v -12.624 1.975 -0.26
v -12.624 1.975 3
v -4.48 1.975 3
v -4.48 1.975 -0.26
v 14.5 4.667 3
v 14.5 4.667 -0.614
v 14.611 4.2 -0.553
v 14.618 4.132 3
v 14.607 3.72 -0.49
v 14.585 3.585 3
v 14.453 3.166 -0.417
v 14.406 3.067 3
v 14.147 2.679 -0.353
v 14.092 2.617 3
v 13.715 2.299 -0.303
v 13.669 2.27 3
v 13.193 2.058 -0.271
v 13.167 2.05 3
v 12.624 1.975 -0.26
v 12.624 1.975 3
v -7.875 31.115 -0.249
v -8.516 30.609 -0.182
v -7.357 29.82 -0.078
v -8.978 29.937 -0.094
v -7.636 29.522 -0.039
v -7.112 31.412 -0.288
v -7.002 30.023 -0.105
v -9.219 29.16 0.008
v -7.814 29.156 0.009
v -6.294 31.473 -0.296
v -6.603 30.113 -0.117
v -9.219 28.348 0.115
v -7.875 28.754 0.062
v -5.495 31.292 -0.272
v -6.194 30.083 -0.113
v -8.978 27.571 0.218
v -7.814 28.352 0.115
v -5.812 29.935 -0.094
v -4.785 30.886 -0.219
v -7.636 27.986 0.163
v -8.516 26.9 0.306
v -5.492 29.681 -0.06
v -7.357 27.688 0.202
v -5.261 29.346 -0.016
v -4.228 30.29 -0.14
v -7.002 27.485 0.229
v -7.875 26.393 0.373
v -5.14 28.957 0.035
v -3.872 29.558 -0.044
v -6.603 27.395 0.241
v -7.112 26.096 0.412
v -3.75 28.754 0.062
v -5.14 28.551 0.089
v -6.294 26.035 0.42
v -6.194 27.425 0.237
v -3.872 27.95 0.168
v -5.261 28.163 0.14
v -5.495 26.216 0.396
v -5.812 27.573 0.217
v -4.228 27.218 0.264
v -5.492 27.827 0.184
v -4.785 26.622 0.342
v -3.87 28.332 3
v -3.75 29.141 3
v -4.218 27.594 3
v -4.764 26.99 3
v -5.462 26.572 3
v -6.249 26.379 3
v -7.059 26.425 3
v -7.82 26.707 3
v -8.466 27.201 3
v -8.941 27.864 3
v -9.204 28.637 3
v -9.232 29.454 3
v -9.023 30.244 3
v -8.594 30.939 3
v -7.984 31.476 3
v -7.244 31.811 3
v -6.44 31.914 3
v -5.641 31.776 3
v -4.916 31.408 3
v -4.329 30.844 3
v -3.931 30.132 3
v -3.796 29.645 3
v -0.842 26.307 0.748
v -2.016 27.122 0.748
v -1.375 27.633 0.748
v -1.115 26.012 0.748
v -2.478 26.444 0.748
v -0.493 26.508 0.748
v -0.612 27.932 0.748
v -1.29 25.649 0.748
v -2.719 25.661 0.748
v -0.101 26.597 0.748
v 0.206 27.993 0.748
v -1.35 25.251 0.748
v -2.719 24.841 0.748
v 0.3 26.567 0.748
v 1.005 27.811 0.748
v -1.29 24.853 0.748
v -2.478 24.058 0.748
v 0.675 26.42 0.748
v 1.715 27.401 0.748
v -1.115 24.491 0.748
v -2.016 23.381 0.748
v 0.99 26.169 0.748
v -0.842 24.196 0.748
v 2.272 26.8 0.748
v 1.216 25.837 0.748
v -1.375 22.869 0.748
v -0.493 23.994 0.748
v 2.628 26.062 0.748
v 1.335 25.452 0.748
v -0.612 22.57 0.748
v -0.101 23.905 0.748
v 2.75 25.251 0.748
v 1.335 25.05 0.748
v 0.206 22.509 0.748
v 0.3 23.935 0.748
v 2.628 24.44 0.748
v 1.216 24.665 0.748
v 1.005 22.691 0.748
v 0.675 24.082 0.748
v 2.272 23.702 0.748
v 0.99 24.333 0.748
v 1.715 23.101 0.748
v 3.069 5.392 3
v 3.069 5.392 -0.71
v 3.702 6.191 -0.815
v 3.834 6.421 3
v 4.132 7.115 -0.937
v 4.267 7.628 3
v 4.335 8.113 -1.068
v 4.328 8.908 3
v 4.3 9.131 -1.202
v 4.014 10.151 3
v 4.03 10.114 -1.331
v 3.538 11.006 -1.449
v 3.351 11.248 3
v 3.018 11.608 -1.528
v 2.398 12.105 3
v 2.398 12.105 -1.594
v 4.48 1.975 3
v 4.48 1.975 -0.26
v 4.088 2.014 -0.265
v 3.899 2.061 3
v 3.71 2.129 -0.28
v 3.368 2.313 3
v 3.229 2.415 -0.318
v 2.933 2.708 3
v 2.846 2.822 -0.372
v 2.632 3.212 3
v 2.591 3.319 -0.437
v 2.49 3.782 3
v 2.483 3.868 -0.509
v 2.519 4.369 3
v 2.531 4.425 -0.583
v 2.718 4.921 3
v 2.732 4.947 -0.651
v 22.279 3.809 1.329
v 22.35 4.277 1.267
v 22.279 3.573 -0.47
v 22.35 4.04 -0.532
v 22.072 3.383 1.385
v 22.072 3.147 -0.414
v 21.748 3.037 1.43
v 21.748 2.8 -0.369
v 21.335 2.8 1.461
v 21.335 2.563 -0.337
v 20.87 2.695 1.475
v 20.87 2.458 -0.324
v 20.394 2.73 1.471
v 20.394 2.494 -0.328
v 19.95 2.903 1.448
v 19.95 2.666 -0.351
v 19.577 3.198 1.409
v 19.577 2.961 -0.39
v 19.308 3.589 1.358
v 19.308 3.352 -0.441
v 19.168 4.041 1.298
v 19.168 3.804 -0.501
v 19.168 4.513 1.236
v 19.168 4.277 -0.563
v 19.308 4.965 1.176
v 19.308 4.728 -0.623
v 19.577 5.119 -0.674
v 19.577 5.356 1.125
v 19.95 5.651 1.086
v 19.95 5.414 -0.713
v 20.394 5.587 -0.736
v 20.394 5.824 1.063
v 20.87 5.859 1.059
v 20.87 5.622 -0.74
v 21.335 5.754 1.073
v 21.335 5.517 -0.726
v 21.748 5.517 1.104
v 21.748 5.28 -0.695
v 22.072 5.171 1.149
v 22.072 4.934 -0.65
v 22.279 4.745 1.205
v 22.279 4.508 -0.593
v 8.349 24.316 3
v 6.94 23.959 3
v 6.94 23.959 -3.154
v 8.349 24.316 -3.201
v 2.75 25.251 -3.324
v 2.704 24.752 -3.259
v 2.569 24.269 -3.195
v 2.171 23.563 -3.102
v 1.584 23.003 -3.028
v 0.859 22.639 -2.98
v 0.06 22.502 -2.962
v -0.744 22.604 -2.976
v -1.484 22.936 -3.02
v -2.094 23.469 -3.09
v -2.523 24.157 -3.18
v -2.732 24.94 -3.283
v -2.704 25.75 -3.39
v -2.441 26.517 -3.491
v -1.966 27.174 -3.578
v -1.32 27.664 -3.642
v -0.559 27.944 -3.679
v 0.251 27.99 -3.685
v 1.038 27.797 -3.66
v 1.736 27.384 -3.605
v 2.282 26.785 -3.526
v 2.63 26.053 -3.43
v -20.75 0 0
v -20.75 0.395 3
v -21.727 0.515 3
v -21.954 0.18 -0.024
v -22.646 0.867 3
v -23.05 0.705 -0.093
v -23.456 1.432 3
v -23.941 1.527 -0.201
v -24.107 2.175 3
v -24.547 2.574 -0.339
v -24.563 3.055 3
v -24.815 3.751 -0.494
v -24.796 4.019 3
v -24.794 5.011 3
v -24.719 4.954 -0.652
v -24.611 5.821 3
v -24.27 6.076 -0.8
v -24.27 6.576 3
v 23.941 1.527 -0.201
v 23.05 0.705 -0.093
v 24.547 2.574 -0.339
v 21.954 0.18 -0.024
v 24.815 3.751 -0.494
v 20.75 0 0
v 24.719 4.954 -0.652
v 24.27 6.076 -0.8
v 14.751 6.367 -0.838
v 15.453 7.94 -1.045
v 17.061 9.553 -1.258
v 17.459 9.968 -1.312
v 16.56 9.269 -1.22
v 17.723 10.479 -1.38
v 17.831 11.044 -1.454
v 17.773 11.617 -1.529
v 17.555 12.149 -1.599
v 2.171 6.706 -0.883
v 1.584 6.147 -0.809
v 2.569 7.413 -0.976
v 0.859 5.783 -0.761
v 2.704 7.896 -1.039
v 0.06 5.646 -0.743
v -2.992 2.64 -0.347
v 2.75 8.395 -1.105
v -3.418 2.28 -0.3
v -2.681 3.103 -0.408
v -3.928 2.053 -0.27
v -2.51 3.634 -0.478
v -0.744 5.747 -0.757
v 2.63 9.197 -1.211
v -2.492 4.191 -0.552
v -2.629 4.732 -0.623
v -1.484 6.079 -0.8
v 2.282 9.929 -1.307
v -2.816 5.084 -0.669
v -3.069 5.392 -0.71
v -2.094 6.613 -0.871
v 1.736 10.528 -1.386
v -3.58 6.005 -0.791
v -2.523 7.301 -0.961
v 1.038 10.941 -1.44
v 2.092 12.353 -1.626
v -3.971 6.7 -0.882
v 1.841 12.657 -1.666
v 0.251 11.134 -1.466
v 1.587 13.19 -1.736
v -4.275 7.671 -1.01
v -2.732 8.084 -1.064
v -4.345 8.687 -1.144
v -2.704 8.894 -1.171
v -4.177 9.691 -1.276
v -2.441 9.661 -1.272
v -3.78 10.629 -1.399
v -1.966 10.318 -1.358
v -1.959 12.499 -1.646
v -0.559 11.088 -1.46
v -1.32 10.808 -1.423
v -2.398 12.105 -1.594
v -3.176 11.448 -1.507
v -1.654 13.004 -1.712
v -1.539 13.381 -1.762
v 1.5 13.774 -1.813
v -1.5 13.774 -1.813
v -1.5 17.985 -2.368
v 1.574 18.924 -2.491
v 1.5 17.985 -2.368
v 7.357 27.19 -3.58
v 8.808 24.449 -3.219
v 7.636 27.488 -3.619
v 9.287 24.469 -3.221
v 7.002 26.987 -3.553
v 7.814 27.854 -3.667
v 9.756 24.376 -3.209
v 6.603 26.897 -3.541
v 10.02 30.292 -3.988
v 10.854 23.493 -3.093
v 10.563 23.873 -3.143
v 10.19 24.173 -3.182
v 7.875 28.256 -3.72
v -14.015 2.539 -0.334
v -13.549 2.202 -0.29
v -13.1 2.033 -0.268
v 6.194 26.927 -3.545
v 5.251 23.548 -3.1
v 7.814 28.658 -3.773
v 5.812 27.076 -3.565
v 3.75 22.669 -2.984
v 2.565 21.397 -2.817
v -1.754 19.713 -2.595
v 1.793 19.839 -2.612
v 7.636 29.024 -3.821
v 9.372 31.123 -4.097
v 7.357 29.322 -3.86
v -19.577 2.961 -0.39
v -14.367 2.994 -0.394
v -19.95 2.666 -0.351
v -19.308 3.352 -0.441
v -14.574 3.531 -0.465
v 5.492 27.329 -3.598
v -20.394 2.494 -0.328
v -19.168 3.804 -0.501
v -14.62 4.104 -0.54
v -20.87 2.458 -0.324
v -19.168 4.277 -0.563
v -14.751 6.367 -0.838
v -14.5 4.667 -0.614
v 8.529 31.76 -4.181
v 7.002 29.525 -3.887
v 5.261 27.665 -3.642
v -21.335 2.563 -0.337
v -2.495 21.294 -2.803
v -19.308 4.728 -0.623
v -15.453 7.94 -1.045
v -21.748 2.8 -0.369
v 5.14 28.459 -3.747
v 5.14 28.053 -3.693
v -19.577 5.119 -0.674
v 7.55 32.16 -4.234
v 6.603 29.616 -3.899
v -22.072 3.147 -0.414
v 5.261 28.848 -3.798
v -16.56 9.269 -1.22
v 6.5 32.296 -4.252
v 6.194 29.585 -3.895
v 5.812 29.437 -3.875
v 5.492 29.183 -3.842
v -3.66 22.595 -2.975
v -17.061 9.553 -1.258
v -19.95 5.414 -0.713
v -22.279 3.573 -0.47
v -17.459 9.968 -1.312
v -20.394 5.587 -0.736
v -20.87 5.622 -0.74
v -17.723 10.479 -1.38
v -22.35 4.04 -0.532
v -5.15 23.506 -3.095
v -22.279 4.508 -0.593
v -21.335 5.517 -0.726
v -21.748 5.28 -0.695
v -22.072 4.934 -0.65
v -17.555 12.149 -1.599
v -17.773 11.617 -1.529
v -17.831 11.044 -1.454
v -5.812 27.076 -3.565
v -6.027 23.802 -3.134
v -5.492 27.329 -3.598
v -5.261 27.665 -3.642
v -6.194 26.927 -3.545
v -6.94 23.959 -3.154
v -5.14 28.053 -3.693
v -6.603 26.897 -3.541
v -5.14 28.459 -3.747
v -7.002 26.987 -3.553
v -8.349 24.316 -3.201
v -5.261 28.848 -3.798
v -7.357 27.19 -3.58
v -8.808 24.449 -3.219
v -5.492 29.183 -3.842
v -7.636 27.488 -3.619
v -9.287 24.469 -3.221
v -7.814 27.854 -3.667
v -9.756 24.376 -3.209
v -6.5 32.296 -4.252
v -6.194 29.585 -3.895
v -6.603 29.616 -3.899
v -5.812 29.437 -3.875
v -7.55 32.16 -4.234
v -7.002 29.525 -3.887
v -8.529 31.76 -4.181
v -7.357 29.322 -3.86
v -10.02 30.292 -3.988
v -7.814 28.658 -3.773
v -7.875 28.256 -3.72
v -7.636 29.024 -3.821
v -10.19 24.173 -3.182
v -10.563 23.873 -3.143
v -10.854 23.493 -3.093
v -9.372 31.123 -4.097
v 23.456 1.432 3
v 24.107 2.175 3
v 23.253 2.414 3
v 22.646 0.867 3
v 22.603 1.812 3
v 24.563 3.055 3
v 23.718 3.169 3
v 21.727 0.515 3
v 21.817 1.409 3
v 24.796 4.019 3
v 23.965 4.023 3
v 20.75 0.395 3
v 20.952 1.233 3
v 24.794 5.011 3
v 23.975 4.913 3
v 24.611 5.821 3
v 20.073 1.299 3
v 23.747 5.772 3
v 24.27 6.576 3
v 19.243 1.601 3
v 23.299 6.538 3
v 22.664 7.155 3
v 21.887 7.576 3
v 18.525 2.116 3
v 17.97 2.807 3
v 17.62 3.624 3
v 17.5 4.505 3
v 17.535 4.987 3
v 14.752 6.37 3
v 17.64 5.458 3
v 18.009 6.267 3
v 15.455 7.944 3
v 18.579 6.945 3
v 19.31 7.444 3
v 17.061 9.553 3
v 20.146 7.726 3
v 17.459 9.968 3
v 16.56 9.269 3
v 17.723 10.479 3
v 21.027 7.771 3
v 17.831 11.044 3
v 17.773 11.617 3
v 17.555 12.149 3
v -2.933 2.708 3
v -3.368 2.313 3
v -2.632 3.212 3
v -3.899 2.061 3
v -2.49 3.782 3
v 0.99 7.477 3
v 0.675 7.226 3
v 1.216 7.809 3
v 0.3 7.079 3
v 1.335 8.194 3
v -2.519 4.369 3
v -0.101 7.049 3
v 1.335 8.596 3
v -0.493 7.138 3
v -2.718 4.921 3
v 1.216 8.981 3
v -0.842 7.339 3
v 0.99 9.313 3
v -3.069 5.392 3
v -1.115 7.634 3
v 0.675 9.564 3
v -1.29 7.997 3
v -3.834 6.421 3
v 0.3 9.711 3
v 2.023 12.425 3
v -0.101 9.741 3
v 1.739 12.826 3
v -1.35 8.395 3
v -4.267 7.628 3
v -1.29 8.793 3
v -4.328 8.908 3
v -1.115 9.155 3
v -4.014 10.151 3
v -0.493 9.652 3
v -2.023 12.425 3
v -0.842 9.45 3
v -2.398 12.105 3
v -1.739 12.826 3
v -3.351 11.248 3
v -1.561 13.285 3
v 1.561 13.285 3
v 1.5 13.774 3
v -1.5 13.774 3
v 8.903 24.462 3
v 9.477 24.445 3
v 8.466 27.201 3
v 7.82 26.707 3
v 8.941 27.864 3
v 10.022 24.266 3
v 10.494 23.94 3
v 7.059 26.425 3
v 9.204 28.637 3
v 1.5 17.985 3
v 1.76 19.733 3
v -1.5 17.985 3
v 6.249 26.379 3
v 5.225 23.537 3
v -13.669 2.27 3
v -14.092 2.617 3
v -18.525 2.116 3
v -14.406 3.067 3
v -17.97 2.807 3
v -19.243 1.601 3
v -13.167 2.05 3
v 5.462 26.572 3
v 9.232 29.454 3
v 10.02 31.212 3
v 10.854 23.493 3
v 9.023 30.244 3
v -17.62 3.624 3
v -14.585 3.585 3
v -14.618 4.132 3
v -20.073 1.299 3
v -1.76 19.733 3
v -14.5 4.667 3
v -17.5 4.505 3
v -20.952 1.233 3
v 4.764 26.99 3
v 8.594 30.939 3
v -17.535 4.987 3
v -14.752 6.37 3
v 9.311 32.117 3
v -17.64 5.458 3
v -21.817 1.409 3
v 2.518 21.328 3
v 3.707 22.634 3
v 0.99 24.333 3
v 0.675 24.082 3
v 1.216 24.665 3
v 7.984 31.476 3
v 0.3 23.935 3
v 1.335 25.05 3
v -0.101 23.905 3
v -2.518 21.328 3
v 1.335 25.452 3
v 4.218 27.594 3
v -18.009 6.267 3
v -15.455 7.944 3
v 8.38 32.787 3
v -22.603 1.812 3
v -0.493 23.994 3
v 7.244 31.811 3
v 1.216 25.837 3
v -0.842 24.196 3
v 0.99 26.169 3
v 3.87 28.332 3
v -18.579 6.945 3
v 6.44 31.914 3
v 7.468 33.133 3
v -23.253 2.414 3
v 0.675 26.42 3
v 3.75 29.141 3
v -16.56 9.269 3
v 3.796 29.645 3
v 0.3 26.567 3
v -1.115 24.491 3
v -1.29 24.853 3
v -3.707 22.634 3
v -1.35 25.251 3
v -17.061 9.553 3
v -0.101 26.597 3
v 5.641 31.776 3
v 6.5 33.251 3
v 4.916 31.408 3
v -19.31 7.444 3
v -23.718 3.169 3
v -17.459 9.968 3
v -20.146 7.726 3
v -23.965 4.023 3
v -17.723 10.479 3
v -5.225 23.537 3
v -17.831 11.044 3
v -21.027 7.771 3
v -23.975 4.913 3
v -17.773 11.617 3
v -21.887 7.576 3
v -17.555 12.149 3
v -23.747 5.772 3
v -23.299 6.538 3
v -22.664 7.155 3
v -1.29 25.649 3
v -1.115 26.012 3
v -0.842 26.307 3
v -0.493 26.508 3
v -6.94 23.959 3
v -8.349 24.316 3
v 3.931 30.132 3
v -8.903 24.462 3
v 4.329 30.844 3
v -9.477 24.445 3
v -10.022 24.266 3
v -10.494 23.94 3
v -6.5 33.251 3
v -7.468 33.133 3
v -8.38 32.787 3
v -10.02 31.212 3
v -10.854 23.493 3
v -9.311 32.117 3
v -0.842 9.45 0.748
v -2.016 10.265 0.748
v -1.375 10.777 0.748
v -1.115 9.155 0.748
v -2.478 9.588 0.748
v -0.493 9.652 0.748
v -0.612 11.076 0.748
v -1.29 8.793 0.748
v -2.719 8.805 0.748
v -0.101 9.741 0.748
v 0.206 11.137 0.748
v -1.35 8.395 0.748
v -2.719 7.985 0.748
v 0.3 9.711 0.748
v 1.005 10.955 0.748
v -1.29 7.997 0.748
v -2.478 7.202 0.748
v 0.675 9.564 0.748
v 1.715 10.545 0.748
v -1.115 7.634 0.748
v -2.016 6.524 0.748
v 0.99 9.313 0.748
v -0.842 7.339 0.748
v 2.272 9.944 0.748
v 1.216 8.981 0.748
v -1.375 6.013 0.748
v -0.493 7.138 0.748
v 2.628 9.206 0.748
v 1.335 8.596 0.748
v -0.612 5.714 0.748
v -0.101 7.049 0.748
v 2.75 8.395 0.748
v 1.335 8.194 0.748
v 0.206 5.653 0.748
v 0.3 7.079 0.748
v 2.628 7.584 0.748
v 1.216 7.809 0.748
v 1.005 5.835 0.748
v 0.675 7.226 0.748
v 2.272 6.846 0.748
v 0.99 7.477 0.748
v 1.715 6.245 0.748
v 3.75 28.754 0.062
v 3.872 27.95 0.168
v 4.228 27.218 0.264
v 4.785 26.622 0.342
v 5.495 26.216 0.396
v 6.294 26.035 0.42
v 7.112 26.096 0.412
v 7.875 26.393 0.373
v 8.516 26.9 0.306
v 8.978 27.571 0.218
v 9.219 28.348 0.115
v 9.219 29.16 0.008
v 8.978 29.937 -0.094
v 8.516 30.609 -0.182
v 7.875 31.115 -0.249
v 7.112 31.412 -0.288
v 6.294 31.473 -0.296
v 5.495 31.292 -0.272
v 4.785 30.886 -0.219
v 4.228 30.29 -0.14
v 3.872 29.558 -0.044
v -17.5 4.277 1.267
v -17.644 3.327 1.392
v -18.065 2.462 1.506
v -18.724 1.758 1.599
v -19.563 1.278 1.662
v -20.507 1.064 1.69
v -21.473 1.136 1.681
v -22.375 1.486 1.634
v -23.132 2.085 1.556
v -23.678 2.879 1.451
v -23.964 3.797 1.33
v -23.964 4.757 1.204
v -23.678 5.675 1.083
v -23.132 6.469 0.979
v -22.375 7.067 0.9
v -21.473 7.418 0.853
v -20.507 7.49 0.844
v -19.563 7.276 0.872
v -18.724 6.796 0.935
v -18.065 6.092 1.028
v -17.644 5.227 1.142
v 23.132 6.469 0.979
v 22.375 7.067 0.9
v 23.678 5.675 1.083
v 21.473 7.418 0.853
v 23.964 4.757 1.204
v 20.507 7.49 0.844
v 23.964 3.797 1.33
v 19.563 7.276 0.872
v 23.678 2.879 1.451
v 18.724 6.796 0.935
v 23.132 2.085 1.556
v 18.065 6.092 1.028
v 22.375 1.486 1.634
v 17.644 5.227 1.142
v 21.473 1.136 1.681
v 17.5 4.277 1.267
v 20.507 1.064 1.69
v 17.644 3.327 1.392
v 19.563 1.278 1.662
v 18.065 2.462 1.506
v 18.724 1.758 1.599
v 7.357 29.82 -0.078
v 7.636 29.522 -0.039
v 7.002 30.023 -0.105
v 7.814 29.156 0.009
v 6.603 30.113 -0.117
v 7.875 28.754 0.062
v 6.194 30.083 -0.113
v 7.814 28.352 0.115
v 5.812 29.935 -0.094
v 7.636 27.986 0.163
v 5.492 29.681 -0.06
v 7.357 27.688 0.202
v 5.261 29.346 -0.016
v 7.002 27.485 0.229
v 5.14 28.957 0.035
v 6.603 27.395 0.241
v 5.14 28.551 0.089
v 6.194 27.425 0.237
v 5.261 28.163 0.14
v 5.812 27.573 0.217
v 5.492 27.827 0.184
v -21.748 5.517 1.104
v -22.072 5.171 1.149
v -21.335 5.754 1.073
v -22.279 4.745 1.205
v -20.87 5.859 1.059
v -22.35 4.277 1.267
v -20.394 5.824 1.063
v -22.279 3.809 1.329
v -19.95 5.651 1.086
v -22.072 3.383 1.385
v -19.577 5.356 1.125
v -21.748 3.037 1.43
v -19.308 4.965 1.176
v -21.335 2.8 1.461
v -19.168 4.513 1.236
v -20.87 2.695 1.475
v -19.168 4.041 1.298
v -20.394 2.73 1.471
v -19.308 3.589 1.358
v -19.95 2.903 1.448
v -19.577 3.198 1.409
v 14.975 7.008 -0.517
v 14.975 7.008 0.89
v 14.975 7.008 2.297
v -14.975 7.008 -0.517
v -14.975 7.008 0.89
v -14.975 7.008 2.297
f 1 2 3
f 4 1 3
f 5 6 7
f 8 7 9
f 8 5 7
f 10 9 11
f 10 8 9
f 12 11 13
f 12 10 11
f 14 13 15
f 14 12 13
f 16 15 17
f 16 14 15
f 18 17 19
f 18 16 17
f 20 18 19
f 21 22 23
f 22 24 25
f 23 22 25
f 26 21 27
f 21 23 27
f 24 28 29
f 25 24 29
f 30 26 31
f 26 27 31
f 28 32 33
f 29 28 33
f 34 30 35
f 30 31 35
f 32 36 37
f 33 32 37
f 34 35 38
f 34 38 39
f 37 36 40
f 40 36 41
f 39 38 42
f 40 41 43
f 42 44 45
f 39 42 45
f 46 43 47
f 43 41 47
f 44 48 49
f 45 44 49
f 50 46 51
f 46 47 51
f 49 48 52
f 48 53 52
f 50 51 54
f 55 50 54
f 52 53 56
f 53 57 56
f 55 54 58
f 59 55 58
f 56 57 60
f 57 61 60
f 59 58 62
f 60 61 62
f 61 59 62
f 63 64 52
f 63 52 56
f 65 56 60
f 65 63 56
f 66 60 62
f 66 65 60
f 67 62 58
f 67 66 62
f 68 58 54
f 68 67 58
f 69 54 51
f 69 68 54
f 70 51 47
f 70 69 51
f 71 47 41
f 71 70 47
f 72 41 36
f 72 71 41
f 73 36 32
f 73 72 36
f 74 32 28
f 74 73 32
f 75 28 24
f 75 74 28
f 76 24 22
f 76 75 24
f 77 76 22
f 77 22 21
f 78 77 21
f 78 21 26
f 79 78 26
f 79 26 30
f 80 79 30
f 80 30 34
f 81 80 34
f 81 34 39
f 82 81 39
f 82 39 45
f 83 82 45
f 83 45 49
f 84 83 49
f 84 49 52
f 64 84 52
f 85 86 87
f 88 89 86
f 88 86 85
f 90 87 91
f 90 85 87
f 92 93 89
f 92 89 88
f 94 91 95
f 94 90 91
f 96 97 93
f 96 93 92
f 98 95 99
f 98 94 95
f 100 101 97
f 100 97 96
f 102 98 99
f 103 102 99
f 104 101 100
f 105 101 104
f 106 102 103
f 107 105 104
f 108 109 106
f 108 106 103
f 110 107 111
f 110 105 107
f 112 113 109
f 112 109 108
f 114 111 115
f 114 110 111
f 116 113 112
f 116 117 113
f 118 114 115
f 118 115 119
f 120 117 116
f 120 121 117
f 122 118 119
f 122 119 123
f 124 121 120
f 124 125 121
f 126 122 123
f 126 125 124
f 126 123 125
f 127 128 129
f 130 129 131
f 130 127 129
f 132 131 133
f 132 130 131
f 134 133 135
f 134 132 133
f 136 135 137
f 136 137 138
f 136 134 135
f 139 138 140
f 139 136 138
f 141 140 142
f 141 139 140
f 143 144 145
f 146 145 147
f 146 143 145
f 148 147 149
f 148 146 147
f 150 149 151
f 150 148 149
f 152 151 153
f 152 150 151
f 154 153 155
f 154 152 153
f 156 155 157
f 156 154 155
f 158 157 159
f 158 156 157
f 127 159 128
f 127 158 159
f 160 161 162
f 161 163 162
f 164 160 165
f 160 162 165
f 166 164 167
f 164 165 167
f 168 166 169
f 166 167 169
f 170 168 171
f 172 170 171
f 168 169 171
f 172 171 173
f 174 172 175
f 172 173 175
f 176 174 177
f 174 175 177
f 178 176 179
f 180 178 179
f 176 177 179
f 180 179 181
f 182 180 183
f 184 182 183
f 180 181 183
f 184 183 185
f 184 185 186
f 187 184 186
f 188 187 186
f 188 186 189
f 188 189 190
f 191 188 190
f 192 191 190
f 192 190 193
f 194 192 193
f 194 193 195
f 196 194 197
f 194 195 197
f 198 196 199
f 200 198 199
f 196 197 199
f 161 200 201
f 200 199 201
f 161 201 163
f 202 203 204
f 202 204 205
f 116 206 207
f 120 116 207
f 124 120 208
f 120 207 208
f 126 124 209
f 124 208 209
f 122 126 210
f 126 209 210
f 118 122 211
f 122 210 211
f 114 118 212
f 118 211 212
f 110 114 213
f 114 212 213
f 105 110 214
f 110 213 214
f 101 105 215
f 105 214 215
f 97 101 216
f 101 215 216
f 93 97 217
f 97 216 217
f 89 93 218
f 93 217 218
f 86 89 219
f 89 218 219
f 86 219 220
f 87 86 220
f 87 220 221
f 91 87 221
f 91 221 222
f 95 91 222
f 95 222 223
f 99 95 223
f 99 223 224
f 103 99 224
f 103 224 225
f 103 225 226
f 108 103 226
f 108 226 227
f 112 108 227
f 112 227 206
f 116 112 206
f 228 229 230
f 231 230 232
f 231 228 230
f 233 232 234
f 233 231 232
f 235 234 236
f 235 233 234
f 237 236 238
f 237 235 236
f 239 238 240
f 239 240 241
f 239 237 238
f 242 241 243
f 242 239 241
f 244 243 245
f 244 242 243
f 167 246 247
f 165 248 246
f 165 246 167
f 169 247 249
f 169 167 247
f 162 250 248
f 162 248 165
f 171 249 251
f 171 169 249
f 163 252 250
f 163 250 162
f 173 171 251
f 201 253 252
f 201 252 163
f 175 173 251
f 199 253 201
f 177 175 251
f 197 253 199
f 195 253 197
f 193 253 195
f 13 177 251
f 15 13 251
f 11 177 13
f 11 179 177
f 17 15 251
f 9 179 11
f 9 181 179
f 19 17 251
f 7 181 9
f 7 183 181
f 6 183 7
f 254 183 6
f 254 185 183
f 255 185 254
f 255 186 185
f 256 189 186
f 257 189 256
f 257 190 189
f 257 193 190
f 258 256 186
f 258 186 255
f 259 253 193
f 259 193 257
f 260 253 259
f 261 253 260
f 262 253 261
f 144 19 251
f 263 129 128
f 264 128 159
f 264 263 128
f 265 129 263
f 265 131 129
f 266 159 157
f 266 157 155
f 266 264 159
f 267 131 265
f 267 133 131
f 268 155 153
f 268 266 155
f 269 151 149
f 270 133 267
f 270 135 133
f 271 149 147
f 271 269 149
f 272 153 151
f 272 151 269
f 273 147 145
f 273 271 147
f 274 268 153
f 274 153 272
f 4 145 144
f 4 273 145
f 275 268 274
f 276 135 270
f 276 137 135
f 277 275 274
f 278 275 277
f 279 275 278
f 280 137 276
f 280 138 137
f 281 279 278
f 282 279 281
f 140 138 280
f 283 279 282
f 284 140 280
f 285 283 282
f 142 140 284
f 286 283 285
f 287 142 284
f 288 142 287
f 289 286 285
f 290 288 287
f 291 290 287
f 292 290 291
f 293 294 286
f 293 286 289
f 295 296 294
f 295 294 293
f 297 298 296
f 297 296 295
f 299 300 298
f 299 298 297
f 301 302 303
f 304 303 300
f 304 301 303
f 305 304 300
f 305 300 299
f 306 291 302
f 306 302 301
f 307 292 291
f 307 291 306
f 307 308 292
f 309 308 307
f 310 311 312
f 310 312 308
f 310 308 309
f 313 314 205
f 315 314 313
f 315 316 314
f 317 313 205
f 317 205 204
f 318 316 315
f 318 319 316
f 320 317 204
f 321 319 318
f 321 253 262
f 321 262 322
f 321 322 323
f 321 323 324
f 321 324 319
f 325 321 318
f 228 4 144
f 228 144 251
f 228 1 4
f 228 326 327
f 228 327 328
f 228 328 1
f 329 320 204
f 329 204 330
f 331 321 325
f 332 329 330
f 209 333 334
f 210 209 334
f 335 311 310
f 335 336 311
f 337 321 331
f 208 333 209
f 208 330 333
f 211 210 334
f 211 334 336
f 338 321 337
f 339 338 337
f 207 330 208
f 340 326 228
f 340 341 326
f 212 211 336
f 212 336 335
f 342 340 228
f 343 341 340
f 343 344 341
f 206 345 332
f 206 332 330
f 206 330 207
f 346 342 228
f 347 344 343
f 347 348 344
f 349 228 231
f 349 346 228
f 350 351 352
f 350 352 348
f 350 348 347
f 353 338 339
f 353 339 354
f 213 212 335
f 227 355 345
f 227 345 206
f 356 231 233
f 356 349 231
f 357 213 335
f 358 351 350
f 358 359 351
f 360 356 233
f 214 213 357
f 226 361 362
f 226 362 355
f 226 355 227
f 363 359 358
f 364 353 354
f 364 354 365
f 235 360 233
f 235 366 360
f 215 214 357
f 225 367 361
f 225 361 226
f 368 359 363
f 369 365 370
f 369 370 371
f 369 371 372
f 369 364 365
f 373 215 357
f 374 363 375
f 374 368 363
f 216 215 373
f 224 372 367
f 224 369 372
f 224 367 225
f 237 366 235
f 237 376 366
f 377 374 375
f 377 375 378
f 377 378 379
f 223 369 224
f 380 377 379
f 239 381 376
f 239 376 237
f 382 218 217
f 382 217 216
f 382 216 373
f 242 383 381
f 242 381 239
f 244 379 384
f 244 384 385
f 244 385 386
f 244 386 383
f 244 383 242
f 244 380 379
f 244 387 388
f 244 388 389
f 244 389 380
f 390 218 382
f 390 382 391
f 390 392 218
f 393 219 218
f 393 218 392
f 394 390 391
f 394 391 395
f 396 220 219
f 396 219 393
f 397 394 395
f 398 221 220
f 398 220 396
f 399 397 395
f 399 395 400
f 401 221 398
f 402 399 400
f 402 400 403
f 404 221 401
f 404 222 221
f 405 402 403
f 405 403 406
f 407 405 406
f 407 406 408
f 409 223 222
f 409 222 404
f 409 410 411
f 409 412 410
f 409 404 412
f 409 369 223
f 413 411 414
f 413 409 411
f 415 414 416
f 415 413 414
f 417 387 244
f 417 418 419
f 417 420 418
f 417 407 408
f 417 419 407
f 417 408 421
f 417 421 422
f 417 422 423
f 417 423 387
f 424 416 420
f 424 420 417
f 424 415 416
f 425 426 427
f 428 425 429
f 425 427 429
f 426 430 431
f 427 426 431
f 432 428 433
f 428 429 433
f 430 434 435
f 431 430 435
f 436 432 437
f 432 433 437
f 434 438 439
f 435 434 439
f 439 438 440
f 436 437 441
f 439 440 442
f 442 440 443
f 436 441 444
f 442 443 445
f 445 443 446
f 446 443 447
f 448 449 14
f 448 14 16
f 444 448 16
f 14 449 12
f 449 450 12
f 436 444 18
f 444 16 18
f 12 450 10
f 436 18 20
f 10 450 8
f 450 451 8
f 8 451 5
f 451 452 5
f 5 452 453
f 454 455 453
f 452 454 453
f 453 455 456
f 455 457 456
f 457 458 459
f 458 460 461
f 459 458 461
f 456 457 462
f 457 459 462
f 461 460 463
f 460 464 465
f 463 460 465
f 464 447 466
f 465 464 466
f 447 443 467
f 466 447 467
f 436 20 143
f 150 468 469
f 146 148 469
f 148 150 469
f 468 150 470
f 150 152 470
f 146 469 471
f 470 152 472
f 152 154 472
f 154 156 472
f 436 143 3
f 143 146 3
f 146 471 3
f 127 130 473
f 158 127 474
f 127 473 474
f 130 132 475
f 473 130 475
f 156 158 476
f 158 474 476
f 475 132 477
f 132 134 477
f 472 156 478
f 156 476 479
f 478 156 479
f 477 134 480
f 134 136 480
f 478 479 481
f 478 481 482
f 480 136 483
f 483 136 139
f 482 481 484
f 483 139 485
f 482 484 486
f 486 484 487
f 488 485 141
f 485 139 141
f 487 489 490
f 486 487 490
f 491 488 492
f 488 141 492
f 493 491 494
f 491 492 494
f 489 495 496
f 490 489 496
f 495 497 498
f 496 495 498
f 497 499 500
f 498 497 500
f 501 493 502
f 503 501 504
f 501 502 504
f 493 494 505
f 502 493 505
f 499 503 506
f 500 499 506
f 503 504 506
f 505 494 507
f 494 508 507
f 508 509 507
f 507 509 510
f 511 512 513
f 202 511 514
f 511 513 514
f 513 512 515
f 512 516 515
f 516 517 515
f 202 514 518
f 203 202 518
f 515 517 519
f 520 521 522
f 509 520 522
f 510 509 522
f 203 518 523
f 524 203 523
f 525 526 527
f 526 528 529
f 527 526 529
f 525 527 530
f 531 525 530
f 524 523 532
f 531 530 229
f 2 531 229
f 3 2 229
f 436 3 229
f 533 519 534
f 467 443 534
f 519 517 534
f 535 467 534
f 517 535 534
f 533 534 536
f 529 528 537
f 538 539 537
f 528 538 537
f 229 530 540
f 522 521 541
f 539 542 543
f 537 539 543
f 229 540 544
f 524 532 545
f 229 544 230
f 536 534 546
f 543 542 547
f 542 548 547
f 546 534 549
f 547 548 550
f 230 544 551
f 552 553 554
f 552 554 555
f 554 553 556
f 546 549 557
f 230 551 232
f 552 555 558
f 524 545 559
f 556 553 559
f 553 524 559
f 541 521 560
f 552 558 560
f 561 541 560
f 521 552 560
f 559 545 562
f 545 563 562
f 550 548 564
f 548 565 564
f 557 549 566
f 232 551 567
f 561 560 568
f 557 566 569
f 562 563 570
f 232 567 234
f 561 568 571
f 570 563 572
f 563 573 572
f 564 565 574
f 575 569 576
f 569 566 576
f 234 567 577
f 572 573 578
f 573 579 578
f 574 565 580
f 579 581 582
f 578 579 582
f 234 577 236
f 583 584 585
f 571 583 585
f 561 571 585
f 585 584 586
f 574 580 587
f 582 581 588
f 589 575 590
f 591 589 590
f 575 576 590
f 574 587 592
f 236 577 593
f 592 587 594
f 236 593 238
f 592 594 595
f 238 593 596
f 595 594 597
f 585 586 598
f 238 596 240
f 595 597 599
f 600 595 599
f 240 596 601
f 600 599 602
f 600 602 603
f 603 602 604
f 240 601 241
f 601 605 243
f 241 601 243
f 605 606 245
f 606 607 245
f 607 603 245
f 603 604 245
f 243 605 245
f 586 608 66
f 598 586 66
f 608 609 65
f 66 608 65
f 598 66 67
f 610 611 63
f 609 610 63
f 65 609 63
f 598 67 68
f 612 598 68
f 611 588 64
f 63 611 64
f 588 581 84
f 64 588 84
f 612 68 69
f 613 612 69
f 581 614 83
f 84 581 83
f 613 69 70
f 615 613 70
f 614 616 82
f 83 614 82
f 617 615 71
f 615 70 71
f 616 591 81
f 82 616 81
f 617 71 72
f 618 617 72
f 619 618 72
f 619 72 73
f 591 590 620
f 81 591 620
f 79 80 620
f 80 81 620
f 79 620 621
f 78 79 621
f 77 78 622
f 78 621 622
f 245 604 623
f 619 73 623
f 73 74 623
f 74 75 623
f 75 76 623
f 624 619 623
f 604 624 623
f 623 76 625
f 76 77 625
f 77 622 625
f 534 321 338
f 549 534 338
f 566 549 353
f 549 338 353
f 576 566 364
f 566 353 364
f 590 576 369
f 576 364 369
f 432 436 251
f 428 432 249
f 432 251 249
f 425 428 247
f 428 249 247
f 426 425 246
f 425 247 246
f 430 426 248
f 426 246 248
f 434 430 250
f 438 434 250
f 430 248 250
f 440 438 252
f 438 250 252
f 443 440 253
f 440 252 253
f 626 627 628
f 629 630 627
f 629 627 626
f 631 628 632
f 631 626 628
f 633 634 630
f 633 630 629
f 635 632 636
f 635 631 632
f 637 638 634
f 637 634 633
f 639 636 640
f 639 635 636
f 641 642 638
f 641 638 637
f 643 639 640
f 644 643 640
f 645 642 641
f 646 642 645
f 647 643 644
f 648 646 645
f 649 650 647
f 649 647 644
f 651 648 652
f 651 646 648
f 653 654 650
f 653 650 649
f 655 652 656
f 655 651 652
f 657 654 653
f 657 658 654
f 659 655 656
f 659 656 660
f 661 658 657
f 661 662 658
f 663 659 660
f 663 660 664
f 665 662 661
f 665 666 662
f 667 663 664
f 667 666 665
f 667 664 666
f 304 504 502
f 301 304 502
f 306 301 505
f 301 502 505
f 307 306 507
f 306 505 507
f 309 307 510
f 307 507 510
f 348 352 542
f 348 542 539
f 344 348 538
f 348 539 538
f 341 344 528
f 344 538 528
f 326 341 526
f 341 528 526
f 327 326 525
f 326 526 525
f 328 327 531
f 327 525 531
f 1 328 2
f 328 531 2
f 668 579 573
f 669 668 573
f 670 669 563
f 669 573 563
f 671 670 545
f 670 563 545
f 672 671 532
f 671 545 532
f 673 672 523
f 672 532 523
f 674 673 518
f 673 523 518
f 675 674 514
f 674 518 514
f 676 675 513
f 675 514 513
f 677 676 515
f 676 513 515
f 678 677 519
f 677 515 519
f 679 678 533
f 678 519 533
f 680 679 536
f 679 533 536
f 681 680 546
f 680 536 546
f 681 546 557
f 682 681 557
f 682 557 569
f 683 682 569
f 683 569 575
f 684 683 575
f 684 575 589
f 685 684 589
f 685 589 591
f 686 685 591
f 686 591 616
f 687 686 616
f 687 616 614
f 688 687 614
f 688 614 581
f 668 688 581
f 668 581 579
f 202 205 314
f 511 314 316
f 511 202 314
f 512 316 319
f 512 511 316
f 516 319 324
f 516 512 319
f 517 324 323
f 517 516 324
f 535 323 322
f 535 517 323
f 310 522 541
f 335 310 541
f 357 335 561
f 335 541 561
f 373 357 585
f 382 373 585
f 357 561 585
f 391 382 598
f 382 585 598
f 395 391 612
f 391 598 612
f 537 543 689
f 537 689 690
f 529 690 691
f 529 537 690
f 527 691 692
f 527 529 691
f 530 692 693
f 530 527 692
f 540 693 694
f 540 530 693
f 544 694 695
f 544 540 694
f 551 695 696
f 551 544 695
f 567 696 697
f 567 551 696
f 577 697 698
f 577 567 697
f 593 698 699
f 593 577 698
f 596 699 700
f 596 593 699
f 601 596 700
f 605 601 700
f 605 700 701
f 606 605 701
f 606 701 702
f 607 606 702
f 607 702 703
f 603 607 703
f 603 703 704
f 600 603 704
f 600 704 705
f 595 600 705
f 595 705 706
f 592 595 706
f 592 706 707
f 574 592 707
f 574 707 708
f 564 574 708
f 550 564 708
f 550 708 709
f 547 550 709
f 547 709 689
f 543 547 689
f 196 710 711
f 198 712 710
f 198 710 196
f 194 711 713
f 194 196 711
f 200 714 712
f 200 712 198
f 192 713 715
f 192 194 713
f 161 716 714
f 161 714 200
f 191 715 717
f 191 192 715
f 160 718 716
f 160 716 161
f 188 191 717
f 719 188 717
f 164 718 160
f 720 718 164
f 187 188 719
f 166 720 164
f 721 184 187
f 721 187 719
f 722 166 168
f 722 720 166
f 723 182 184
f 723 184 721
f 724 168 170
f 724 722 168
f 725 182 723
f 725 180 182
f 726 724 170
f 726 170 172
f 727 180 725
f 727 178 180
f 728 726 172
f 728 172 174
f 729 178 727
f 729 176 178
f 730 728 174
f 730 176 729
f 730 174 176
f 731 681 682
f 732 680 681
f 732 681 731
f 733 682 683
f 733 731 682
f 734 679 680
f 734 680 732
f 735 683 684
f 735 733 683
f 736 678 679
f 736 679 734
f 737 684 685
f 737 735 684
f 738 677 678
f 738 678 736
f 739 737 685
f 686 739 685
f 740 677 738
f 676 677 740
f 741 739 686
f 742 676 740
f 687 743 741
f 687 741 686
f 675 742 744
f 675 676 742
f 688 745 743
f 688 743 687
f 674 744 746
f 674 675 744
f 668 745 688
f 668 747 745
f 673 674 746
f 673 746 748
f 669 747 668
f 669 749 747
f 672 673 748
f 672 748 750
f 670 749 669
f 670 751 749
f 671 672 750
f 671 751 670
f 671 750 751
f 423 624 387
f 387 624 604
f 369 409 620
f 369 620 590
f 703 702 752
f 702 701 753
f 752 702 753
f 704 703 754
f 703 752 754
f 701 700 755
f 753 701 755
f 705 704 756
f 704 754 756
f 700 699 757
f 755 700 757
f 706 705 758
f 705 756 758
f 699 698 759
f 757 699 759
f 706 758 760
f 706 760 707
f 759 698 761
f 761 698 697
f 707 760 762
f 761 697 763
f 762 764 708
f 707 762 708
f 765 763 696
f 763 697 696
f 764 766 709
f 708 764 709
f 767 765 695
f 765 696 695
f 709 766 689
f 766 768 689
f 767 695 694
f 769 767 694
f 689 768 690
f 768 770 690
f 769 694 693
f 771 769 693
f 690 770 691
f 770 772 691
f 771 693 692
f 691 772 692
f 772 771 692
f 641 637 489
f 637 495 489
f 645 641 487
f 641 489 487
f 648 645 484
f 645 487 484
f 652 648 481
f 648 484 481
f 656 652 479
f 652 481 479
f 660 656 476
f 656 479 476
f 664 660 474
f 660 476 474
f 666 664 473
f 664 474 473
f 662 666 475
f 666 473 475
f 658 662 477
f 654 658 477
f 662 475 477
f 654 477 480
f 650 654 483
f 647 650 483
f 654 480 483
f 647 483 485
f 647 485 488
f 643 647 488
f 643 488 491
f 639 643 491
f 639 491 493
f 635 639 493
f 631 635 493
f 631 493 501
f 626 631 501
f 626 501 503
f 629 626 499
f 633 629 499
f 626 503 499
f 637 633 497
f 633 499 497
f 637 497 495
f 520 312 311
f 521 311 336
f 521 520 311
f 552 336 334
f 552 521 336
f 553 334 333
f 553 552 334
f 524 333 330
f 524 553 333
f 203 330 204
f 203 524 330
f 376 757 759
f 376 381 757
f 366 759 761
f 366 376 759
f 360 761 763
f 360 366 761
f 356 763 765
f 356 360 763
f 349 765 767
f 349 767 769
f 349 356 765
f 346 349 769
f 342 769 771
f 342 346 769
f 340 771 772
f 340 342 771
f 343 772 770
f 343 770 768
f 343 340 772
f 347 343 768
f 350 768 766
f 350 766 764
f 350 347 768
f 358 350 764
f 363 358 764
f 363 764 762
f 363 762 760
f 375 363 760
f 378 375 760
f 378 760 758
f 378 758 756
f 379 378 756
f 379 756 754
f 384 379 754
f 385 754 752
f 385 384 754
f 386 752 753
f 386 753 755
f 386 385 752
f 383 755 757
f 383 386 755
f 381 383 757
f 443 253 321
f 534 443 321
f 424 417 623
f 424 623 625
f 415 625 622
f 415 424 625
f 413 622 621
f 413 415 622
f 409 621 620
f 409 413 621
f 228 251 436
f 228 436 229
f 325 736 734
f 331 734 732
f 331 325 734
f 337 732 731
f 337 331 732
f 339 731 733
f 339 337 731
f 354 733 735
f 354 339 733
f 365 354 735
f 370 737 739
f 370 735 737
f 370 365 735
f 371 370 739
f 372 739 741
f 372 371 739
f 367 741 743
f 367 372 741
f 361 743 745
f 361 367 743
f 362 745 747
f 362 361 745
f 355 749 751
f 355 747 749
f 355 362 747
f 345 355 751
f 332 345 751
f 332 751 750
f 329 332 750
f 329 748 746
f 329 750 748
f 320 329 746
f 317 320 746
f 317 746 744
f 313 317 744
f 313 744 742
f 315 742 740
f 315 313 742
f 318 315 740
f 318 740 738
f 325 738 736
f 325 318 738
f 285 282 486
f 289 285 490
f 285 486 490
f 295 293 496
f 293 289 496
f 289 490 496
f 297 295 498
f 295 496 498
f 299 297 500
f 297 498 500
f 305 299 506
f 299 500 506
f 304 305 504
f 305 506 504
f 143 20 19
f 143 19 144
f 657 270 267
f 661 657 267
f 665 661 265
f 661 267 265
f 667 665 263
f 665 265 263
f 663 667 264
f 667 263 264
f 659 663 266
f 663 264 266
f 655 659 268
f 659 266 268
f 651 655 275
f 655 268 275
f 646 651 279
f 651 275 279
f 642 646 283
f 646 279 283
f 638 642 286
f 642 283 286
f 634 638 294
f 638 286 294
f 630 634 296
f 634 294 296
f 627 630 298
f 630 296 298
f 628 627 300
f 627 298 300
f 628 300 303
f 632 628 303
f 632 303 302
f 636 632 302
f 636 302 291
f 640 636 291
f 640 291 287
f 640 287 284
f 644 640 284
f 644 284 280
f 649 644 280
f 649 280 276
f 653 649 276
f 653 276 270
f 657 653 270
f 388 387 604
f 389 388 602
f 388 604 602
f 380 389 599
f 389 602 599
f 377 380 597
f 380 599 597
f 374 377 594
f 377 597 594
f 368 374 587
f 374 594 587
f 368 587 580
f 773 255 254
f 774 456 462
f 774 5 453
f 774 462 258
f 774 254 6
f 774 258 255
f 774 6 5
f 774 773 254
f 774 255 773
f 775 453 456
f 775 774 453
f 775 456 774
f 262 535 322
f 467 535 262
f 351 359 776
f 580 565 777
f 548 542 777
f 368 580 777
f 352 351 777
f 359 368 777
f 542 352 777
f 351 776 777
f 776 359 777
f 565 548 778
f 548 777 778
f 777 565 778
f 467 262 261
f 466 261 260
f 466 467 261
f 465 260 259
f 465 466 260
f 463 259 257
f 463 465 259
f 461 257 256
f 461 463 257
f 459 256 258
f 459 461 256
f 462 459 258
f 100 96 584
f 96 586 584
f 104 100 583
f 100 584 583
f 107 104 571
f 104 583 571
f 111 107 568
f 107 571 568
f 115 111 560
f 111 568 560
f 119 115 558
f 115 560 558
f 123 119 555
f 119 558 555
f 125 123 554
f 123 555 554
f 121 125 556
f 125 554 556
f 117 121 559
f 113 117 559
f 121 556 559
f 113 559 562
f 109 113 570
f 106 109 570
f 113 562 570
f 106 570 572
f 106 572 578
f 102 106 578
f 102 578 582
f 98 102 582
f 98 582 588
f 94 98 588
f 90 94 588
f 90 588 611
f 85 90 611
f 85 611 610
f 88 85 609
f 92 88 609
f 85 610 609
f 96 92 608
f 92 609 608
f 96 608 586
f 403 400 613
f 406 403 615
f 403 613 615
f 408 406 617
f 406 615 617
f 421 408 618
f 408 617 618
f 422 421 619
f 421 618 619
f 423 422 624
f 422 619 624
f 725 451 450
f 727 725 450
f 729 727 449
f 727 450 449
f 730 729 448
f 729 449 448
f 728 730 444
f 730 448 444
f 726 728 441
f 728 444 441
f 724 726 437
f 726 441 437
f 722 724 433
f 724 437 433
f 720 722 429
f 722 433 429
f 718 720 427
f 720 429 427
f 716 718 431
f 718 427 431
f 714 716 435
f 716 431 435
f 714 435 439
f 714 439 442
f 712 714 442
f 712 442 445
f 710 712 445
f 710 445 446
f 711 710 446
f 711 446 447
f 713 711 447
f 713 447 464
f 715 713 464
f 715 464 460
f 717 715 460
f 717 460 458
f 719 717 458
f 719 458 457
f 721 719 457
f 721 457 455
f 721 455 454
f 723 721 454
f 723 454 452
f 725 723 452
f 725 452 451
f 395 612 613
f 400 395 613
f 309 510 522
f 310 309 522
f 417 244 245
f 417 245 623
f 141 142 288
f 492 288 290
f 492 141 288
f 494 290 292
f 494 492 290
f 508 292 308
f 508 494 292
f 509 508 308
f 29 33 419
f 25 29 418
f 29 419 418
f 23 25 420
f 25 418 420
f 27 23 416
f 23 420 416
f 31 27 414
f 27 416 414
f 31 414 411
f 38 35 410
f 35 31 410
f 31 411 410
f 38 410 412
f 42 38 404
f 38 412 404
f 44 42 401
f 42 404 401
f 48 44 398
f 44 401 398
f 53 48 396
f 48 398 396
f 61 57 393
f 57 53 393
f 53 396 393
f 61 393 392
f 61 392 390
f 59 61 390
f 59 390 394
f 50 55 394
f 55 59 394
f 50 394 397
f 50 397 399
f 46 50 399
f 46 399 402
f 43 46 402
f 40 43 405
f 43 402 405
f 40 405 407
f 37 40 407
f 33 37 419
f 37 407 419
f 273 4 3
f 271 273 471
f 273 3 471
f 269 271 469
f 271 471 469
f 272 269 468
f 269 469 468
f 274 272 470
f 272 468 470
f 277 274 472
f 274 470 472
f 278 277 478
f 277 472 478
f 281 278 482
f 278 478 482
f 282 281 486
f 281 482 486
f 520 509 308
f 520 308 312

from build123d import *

# Parameters (mm, degrees)
BOSS_EXTRUDE1_REACH              = 47.134
SKETCH1_R                        = 1.375
SKETCH1_R_2                      = 1.575
CBORE_FOR_M3_SHCS1_D             = 3.2
CBORE_FOR_M3_SHCS1_CBORE_D       = 6.5
CBORE_FOR_M3_SHCS1_CBORE_DEPTH   = 5.5
CBORE_FOR_M2_5_SHCS2_D           = 2.7
CBORE_FOR_M2_5_SHCS2_CBORE_D     = 5.5
CBORE_FOR_M2_5_SHCS2_CBORE_DEPTH = 3.5
CBORE_FOR_M2_5_SHCS1_D           = 2.7
CBORE_FOR_M2_5_SHCS1_CBORE_D     = 5.5
CBORE_FOR_M2_5_SHCS1_CBORE_DEPTH = 5
CUT_EXTRUDE2_DEPTH               = 43.124845356


with BuildPart() as part:
    # Boss-Extrude1: up to this plane
    boss_extrude1_end = Plane(origin=(0, 0, 3), z_dir=(0, 0, 1))
    # Sketch1 → Boss-Extrude1 (new, up to the surface)
    with BuildSketch(Plane(origin=(0, 0, 0), x_dir=(1, 0, 0), z_dir=(0, 0.13052619222005188, 0.9914448613738104)), mode=Mode.PRIVATE) as boss_extrude1_sk1:
        with BuildLine():
            Line((0, 28.5), (0, 0))
            Line((0, 0), (20.75, 0))
            ThreePointArc((20.75, 0), (24.283668849, 2.045514976), (24.269768349, 6.128498422))
            Line((24.269768349, 6.128498422), (10.019768349, 30.553498422))
            ThreePointArc((10.019768349, 30.553498422), (8.529485024, 32.033668849), (6.5, 32.575))
            Line((6.5, 32.575), (0, 32.575))
            Line((0, 32.575), (0, 28.5))
        make_face()
        with Locations((6.5, 28.5)):
            Circle(SKETCH1_R, mode=Mode.SUBTRACT)
        with Locations((20.75, 4.075)):
            Circle(SKETCH1_R_2, mode=Mode.SUBTRACT)
    boss_extrude1_tool1 = split(extrude(boss_extrude1_sk1.sketch, amount=BOSS_EXTRUDE1_REACH, mode=Mode.PRIVATE), bisect_by=boss_extrude1_end, keep=Keep.BOTH, mode=Mode.PRIVATE)
    add(boss_extrude1_tool1.solids().sort_by_distance((9.577344, 13.541974, -1.782835))[0])

    # CBORE for M3 SHCS1 (through all)
    with Locations(Plane(origin=(0, 0.954729524, 7.251890712), x_dir=(-1, 0, 0), z_dir=(0, 0.1305261922200519, 0.9914448613738105))):
        with Locations((-20.75, -4.075)):
            CounterBoreHole(CBORE_FOR_M3_SHCS1_D / 2, CBORE_FOR_M3_SHCS1_CBORE_D / 2, CBORE_FOR_M3_SHCS1_CBORE_DEPTH)

    # CBORE for M2.5 SHCS2 (through all)
    with Locations(Plane(origin=(0, 0.954729524, 7.251890712), x_dir=(-1, 0, 0), z_dir=(0, 0.1305261922200519, 0.9914448613738105))):
        with Locations((-6.5, -28.5)):
            CounterBoreHole(CBORE_FOR_M2_5_SHCS2_D / 2, CBORE_FOR_M2_5_SHCS2_CBORE_D / 2, CBORE_FOR_M2_5_SHCS2_CBORE_DEPTH)

    # Mirror1: part across plane


with BuildPart() as part_1:
    add(part.part)
    add(part.part.mirror(Plane(origin=(0, 0, 0), x_dir=(0, 0, 1), z_dir=(1, 0, 0))))

    # CBORE for M2.5 SHCS1 (through all)
    with Locations(Plane(origin=(0, 0, -4.251890712), x_dir=(1, 0, 0), z_dir=(0, 0, -1))):
        with Locations((0, -25.251045884), (0, -8.394957493)):
            CounterBoreHole(CBORE_FOR_M2_5_SHCS1_D / 2, CBORE_FOR_M2_5_SHCS1_CBORE_D / 2, CBORE_FOR_M2_5_SHCS1_CBORE_DEPTH)

    # Sketch23 → Cut-Extrude2 (cut, through all)
    with BuildSketch(Plane.XY.offset(3)):
        with BuildLine():
            Line((12.623790508, 1.975153321), (4.480234369, 1.975153321))
            ThreePointArc((4.480234369, 1.975153321), (2.631634132, 3.211820389), (3.06913693, 5.392476156))
            ThreePointArc((3.06913693, 5.392476156), (4.328394301, 8.908169224), (2.397637796, 12.104730845))
            ThreePointArc((2.397637796, 12.104730845), (1.738647621, 12.826064632), (1.5, 13.773502121))
            Line((1.5, 13.773502121), (1.5, 17.985353527))
            ThreePointArc((1.5, 17.985353527), (3.063849532, 22.025225929), (6.940189675, 23.95918081))
            add(Edge.make_bspline(
                [(6.940189675, 23.95918081), (7.143604146, 23.981751029), (7.344683783, 24.016038635), (7.816288161, 24.124484553), (8.087087758, 24.209901876), (8.34862861, 24.315832383)],
                knots=[0.012994592, 0.012994592, 0.012994592, 0.012994592, 0.03125, 0.03125, 0.056300514, 0.056300514, 0.056300514, 0.056300514], degree=3))
            ThreePointArc((8.34862861, 24.315832383), (9.755972375, 24.375542014), (10.853622853, 23.492736744))
            Line((10.853622853, 23.492736744), (17.554812696, 12.149159325))
            ThreePointArc((17.554812696, 12.149159325), (17.723323038, 10.479170001), (16.560336213, 9.268913106))
            add(Edge.make_bspline(
                [(16.560336213, 9.268913106), (16.480857204, 9.196624751), (16.403239059, 9.122286883), (16.039402336, 8.755578367), (15.775927636, 8.431934638), (15.323177175, 7.748349007), (15.13178367, 7.387522034), (14.897329537, 6.817641357), (14.827739454, 6.621790337), (14.70905517, 6.227430948), (14.65970092, 6.02861076), (14.54474316, 5.446923453), (14.504405456, 5.059906471), (14.500341277, 4.666931627)],
                knots=[0.616779988, 0.616779988, 0.616779988, 0.616779988, 0.625, 0.625, 0.65625, 0.65625, 0.6875, 0.6875, 0.703125, 0.703125, 0.71875, 0.71875, 0.748473893, 0.748473893, 0.748473893, 0.748473893], degree=3))
            ThreePointArc((14.500341277, 4.666931627), (14.264454492, 2.831378127), (12.623790508, 1.975153321))
        make_face()
    cut_extrude2 = extrude(amount=-CUT_EXTRUDE2_DEPTH, mode=Mode.SUBTRACT)

    # Mirror2: Cut-Extrude2 across plane
    add(cut_extrude2.mirror(Plane(origin=(0, 0, 0), x_dir=(0, 0, 1), z_dir=(1, 0, 0))), mode=Mode.SUBTRACT)


solid = part_1.part
